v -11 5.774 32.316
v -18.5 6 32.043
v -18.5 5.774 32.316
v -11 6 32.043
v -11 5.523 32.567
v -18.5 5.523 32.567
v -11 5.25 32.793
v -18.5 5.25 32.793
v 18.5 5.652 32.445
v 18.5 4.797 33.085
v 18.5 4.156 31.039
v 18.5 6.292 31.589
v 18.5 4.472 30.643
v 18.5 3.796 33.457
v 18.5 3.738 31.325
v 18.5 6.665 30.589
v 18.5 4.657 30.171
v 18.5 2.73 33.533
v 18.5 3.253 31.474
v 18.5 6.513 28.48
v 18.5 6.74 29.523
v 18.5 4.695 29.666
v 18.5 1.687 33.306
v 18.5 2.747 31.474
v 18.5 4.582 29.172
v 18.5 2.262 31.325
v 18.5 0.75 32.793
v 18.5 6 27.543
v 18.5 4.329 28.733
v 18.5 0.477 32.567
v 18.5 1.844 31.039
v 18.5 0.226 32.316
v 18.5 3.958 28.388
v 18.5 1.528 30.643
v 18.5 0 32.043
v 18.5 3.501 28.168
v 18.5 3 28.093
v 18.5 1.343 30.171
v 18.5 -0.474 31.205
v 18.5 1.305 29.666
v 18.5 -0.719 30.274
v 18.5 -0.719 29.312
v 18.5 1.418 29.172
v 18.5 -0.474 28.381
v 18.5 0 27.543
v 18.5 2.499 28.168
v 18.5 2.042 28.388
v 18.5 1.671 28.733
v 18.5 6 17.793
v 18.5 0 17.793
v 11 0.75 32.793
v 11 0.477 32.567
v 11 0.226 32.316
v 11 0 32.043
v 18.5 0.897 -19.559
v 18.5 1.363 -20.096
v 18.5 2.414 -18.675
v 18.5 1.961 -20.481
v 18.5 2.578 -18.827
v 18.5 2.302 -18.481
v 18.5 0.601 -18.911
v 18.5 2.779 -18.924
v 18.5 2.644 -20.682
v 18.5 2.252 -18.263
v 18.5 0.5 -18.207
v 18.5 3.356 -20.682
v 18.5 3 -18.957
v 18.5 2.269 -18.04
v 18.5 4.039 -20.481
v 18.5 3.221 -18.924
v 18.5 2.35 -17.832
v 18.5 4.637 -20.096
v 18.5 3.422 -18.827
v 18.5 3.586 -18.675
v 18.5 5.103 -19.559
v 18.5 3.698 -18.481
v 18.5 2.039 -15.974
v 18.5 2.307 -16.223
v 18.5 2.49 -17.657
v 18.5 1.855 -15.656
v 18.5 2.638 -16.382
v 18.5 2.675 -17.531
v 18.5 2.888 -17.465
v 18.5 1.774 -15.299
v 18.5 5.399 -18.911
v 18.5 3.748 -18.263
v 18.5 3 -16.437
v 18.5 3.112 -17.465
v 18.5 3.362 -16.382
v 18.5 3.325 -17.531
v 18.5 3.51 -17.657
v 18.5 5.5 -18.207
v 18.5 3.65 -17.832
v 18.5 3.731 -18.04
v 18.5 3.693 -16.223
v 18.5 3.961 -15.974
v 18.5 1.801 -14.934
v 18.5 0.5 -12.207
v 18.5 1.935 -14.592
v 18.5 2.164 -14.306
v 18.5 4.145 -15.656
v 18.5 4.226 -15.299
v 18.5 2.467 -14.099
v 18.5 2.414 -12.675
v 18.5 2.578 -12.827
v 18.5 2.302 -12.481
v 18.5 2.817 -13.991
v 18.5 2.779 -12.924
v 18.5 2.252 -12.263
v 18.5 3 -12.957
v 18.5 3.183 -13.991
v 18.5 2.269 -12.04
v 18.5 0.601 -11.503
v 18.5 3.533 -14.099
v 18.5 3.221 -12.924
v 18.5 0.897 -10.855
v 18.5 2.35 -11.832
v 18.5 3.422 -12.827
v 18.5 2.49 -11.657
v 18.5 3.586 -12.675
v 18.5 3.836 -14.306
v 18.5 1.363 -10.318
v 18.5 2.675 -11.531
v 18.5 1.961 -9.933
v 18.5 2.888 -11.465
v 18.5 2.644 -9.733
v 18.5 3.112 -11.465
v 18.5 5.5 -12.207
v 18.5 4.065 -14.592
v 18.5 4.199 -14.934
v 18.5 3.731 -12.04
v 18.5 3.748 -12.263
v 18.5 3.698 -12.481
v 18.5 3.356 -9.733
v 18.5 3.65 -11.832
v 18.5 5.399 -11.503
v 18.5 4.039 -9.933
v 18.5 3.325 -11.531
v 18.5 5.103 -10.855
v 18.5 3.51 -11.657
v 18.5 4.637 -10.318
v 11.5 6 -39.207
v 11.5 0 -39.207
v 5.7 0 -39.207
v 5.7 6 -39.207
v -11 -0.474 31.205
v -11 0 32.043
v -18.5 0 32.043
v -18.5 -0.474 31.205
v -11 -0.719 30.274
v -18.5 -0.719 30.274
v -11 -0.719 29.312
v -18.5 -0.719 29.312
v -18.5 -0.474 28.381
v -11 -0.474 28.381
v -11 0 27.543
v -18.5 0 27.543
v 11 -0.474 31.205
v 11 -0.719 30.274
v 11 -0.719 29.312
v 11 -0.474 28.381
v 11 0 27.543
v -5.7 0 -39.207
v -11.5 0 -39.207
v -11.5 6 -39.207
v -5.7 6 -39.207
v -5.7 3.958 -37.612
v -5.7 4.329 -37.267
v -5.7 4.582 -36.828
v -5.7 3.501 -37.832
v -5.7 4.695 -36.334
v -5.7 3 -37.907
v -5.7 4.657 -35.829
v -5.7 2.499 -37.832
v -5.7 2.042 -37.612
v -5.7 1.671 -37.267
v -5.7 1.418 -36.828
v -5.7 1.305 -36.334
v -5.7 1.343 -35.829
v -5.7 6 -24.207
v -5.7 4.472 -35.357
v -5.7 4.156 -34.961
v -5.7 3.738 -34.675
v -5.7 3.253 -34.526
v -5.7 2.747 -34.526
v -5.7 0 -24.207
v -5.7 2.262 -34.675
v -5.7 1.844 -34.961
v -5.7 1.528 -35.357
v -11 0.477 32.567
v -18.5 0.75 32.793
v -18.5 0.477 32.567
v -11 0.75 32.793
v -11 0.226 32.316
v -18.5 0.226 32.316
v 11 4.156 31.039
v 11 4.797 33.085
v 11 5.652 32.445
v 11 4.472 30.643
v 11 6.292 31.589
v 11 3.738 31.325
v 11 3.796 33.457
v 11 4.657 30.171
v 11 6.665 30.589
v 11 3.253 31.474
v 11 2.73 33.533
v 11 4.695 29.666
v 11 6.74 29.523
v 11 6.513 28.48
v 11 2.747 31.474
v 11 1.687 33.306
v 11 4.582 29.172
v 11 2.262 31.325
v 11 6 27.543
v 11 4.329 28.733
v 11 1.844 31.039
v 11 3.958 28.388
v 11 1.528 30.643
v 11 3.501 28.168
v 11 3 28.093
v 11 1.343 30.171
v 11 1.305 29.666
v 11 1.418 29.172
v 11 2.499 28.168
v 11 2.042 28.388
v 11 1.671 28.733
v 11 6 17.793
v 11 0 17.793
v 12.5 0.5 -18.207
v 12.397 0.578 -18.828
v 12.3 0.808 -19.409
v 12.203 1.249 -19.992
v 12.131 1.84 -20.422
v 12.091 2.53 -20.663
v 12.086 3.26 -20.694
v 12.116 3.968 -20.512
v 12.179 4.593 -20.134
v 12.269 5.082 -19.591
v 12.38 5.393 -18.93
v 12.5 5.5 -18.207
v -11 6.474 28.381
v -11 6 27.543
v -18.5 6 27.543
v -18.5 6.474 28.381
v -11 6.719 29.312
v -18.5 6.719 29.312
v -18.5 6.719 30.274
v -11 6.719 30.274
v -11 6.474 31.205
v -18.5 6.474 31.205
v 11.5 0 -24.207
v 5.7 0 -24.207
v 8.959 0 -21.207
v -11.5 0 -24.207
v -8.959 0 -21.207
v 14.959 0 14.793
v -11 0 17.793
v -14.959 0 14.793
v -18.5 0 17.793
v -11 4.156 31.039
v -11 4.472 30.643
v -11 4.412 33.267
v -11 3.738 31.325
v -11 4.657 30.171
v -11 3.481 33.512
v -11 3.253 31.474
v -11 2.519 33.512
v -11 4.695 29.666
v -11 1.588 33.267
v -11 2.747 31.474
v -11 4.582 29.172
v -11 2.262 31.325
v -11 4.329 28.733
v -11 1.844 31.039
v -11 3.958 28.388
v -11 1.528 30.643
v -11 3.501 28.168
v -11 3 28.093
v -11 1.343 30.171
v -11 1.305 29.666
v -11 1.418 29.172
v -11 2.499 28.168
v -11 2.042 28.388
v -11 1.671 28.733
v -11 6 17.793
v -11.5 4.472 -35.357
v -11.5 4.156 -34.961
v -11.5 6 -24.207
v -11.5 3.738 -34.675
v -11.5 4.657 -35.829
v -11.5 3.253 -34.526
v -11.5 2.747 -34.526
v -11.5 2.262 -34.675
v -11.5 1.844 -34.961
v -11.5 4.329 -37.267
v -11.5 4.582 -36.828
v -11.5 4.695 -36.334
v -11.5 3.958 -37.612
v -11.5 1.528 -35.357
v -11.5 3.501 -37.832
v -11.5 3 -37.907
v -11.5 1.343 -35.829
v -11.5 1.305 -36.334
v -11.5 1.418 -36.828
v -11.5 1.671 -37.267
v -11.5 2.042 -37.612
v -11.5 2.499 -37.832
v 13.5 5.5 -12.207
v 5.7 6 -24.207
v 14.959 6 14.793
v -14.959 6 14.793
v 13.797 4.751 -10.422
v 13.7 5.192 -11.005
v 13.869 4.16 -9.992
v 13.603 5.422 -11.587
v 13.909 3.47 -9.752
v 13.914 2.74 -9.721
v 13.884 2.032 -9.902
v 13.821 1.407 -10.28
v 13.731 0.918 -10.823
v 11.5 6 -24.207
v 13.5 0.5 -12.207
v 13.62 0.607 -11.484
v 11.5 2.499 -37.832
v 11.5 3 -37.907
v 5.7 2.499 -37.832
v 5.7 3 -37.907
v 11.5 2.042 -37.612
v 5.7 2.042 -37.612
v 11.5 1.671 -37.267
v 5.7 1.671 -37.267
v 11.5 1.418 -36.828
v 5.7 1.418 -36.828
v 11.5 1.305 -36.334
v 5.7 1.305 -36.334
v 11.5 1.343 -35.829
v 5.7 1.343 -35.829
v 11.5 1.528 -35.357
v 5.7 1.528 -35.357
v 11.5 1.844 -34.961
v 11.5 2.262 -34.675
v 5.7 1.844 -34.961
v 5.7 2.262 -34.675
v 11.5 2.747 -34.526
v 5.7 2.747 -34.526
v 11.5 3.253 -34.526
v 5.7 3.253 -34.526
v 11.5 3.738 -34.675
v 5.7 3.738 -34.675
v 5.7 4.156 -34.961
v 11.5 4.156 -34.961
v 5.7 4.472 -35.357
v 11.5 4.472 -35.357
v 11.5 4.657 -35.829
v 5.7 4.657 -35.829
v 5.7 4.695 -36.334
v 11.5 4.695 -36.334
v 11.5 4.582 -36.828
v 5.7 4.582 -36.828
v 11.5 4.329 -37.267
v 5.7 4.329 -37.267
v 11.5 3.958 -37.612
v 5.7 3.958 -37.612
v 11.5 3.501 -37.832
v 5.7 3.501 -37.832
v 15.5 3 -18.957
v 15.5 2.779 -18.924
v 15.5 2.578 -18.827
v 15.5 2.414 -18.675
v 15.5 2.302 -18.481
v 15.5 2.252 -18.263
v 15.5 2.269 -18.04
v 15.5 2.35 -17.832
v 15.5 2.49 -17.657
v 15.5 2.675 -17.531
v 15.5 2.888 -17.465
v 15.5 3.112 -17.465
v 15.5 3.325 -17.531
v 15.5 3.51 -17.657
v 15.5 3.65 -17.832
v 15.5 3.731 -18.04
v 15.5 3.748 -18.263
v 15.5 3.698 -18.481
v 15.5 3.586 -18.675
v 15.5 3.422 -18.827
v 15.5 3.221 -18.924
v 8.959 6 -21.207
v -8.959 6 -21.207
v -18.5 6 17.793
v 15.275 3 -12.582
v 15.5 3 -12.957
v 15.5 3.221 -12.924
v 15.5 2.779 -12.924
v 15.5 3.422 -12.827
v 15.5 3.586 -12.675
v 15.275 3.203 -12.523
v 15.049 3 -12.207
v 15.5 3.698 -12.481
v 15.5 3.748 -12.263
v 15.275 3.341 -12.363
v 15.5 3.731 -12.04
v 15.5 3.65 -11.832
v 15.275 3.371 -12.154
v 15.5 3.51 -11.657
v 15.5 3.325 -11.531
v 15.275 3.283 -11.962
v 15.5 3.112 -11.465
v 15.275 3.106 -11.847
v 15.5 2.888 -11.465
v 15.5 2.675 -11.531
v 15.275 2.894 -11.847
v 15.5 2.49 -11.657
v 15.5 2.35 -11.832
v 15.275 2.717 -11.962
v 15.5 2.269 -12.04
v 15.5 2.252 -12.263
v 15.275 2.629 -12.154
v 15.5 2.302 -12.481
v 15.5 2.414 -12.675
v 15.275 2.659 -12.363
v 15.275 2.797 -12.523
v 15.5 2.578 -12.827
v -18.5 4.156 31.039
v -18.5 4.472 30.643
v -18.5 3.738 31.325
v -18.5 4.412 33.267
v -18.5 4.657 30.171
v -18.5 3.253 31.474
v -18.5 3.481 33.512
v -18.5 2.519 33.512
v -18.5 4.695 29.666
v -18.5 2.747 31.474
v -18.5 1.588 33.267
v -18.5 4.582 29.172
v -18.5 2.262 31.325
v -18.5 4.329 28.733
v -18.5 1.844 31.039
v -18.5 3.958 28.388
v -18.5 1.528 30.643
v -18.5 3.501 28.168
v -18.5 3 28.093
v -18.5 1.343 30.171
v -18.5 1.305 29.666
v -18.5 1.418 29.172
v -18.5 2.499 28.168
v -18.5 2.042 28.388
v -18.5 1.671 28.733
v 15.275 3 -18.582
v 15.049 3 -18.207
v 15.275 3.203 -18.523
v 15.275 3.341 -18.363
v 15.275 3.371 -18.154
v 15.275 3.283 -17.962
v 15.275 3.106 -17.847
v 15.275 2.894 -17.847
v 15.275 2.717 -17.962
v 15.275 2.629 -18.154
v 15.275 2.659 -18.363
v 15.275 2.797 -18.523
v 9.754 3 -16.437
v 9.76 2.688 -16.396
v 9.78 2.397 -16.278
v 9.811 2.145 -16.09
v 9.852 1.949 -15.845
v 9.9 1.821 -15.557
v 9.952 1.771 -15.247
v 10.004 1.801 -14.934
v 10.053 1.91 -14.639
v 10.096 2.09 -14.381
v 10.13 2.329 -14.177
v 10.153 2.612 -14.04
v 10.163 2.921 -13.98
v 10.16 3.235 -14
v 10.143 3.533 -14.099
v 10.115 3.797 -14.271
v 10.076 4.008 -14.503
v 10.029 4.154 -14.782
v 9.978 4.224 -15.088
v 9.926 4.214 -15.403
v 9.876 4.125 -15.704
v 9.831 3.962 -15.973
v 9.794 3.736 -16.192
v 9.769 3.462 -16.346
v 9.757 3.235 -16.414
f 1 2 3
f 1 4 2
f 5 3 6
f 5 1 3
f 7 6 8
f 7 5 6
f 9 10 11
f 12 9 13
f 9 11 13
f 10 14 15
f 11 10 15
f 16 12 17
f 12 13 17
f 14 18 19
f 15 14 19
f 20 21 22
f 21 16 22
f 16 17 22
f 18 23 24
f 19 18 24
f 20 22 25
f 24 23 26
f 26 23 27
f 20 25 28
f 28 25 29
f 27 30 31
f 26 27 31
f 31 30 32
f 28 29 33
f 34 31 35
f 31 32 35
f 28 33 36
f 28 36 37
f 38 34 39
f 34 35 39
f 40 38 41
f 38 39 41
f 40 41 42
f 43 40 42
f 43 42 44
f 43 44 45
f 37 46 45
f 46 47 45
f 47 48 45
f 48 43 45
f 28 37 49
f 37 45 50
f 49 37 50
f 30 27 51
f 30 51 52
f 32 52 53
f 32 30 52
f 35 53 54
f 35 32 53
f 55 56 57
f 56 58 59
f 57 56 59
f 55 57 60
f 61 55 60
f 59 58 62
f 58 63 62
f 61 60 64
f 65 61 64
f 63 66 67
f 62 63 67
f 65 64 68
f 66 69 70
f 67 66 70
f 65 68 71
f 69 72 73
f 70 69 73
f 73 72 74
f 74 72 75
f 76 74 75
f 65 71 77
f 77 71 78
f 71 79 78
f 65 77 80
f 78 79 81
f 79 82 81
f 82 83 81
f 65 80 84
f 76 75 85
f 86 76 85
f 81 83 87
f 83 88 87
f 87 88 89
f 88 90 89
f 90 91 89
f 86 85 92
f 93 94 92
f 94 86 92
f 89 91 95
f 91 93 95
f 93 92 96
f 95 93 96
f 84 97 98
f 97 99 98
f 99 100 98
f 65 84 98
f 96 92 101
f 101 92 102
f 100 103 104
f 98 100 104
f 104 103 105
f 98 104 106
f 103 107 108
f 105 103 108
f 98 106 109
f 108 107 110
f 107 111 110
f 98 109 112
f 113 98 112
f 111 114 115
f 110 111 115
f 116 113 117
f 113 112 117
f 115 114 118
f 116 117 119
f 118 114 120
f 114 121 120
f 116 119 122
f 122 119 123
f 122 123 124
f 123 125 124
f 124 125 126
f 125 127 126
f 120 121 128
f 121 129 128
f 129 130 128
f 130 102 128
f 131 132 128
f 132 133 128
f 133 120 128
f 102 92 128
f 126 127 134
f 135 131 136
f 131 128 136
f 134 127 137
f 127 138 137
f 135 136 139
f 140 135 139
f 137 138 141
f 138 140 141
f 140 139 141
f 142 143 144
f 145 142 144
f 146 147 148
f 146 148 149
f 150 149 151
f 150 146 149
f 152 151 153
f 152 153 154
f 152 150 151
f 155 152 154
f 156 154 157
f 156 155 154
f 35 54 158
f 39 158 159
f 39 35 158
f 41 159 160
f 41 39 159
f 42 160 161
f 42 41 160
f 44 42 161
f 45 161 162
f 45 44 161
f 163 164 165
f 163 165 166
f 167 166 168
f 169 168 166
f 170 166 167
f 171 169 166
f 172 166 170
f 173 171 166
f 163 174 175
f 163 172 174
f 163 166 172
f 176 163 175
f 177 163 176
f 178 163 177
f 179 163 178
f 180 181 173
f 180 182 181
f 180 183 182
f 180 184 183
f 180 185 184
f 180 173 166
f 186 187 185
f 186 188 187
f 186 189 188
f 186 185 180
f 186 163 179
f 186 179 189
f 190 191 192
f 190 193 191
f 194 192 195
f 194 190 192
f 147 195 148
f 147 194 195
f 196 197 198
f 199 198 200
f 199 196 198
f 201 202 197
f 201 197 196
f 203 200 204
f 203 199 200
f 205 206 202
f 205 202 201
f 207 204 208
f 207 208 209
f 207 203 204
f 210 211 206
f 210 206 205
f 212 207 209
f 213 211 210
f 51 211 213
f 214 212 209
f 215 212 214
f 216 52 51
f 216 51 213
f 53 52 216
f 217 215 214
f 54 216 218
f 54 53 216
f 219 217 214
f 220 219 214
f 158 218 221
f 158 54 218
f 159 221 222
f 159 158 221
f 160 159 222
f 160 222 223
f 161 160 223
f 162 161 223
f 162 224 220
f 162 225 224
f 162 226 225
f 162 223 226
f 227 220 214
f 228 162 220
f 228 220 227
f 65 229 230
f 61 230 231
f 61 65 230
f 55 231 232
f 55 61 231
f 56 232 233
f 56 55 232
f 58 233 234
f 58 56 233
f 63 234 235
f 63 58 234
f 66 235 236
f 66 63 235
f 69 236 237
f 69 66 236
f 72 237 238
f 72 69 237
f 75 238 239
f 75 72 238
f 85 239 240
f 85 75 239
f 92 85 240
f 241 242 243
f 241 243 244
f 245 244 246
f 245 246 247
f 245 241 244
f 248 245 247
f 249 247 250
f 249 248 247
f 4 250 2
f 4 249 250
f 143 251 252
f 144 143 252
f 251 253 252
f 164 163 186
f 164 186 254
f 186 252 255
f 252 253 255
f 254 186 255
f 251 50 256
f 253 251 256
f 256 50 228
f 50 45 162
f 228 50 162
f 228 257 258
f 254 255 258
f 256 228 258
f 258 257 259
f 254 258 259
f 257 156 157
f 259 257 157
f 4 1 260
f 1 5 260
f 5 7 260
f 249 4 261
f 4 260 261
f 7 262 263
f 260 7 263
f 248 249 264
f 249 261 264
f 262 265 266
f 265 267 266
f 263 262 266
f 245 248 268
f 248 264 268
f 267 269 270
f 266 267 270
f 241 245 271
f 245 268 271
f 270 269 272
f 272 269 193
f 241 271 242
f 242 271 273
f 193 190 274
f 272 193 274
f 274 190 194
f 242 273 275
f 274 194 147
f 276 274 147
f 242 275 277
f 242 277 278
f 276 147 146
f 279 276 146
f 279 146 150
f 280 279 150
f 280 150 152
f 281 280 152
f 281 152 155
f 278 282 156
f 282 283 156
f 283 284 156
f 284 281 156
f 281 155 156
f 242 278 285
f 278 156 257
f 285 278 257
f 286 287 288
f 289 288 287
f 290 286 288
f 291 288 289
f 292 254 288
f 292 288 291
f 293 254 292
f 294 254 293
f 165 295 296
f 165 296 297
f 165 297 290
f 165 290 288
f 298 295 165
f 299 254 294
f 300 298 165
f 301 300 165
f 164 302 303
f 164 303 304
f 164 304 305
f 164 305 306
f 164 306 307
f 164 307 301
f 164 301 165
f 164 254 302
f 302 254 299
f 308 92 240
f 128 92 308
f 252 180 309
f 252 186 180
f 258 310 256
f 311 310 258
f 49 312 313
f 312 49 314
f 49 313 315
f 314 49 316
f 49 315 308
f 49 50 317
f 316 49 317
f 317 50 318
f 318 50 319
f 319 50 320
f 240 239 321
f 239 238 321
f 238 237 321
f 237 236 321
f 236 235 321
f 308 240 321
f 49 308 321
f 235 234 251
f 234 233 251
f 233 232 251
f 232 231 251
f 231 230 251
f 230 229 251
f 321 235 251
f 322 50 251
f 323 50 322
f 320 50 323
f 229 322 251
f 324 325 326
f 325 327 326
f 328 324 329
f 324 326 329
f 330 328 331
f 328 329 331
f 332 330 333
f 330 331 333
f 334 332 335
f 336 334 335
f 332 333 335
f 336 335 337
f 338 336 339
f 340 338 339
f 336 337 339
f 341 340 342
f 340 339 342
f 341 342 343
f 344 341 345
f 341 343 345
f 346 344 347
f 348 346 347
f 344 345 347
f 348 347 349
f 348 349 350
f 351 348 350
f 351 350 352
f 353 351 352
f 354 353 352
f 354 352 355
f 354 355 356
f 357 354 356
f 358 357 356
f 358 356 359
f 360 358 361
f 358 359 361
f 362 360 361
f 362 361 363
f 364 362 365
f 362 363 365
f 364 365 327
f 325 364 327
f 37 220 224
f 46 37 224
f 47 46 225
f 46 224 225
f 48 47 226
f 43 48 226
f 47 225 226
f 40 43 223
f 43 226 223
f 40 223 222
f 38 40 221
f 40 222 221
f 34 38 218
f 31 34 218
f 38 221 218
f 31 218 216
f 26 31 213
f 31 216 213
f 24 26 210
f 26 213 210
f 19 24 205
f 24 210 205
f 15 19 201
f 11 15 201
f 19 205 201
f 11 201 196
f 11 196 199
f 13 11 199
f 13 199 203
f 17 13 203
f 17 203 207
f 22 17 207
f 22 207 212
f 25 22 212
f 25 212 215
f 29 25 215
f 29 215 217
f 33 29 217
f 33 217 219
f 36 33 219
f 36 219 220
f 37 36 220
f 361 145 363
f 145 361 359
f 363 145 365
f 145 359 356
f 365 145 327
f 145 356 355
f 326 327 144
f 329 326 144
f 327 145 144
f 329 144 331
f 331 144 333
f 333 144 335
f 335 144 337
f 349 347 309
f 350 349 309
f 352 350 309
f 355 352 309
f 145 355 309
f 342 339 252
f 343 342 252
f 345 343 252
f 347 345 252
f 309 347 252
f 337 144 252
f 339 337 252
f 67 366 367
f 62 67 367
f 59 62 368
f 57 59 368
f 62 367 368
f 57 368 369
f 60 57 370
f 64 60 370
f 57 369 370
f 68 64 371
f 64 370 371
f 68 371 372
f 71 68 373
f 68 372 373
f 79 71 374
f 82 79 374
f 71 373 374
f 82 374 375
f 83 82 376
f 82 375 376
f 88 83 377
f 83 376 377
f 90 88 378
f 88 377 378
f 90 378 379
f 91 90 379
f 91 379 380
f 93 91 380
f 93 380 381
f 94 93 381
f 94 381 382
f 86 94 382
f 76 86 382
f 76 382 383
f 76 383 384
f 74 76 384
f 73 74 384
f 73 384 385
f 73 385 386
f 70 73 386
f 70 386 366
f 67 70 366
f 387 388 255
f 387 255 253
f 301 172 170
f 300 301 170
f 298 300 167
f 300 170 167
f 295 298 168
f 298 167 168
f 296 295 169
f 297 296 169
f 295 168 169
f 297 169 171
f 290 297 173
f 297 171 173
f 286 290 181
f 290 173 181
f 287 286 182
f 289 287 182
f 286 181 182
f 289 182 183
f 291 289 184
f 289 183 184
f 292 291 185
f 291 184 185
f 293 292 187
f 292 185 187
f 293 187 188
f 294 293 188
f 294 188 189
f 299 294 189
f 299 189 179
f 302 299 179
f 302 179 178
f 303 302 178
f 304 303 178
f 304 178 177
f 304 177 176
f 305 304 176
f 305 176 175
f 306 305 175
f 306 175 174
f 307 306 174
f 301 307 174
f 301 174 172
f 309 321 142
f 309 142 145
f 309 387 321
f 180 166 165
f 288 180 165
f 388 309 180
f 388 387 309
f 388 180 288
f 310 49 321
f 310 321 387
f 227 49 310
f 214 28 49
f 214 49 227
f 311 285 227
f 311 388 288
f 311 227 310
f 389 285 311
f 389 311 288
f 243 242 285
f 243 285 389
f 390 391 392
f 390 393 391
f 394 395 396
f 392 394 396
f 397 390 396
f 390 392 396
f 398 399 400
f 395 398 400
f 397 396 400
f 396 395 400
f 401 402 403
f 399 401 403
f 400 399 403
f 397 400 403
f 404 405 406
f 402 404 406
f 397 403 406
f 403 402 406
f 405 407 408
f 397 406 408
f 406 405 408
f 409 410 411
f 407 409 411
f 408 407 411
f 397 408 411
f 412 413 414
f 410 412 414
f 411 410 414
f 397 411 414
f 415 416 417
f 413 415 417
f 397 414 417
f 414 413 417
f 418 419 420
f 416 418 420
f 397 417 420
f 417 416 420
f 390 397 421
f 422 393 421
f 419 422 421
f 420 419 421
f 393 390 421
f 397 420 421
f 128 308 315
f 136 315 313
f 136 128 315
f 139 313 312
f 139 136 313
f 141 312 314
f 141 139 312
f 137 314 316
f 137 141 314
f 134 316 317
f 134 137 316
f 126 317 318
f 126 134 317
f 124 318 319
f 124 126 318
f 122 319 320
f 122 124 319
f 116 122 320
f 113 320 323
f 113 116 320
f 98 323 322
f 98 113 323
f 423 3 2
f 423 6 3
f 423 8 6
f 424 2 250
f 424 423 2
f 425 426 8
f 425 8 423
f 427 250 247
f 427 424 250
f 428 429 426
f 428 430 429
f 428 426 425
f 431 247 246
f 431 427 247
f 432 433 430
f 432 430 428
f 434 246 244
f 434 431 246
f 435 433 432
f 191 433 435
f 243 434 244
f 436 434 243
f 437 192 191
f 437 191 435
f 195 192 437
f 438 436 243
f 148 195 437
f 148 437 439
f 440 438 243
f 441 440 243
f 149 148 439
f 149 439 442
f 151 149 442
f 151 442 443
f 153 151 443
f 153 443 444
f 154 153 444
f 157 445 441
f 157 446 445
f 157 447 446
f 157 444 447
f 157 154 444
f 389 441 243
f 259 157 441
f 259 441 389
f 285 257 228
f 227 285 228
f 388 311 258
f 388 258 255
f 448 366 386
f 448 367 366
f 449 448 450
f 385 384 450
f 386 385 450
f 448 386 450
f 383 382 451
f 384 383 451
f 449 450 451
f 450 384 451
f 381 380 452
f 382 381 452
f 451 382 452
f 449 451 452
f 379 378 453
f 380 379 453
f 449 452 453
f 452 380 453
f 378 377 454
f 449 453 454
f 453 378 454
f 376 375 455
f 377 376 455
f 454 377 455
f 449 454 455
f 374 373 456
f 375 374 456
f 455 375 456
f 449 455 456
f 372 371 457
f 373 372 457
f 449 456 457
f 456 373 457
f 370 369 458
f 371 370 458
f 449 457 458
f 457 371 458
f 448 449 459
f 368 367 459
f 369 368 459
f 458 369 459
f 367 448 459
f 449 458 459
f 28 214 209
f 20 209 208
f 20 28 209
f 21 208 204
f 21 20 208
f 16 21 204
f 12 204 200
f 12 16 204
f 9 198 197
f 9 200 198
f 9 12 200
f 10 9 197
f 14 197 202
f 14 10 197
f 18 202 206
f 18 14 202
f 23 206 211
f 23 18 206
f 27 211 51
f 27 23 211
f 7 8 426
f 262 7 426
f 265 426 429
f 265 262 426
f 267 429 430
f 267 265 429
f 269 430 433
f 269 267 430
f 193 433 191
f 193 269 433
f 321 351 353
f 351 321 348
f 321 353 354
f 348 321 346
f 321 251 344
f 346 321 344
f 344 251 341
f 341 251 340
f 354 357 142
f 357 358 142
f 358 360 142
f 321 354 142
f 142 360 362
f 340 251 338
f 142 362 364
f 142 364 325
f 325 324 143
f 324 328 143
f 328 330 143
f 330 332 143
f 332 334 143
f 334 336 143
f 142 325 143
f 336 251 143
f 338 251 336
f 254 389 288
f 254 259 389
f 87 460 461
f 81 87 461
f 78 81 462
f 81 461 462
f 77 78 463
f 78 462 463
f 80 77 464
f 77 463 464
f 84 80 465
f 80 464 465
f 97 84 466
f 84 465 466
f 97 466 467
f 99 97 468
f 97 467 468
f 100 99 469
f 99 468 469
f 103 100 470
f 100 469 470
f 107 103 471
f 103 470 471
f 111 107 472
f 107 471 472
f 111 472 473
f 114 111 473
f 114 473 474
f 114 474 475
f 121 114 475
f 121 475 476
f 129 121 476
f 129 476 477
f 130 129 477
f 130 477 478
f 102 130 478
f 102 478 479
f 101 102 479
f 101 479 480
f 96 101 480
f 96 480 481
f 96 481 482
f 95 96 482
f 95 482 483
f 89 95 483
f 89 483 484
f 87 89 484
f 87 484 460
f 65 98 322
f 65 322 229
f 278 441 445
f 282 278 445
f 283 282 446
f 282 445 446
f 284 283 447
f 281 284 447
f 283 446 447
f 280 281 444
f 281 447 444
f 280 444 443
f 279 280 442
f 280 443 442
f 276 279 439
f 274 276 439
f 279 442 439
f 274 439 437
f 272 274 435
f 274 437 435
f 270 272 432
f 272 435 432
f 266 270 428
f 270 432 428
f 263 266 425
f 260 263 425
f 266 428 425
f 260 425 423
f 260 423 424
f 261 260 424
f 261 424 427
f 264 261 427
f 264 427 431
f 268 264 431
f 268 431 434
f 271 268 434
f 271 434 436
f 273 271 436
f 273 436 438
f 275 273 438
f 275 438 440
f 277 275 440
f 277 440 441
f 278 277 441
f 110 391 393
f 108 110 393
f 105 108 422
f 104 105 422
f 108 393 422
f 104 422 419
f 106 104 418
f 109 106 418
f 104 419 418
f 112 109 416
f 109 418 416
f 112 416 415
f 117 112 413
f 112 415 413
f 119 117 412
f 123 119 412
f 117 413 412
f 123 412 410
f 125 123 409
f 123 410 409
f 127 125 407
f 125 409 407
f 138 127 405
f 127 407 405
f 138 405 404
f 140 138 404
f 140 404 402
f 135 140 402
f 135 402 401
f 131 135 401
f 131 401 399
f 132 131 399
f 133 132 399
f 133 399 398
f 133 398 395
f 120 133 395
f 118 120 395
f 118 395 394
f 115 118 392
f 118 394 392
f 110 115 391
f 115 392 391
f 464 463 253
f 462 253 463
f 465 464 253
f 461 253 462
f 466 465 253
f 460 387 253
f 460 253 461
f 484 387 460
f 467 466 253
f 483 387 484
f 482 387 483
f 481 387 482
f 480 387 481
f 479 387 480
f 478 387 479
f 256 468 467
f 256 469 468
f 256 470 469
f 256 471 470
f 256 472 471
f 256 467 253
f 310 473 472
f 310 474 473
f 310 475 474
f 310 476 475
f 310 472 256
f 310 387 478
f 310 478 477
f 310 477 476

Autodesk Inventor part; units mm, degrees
ref_plane "YZ Plane" through (0, 0, 0) normal (1, 0, 0) x (0, 1, 0)
ref_plane "XZ Plane" through (0, 0, 0) normal (0, 1, 0) x (-1, 0, 0)
ref_plane "XY Plane" through (0, 0, 0) normal (0, 0, 1) x (1, 0, 0)
sketch "Sketch1" plane through (0, 0, 0) normal (0, 1, 0) x (-1, 0, 0)
  line L0 (11, 32.7929) -> (11, 17.7929)
  line L1 (11, 17.7929) -> (-2.062, 17.7929)
  line L2 (11, 32.7929) -> (18.5, 32.7929)
  line L3 (18.5, 32.7929) -> (18.5, 17.7929)
  line L4 (18.5, 17.7929) -> (11.5, -24.2071)
  line L5 (11.5, -24.2071) -> (11.5, -39.2071)
  line L6 (11.5, -39.2071) -> (5.7, -39.2071)
  line L7 (5.7, -39.2071) -> (5.7, -24.2071)
  line L8 (5.7, -24.2071) -> (0.6352, -24.2071)
  line L9 (0, 0) -> (0, 4.5611)
  line L10 (-11, 32.7929) -> (-11, 17.7929)
  line L11 (-11, 17.7929) -> (-2.062, 17.7929)
  line L12 (-11, 32.7929) -> (-18.5, 32.7929)
  line L13 (-18.5, 32.7929) -> (-18.5, 17.7929)
  line L14 (-18.5, 17.7929) -> (-11.5, -24.2071)
  line L15 (-11.5, -24.2071) -> (-11.5, -39.2071)
  line L16 (-11.5, -39.2071) -> (-5.7, -39.2071)
  line L17 (-5.7, -39.2071) -> (-5.7, -24.2071)
  line L18 (-5.7, -24.2071) -> (0.6352, -24.2071)
  dimension "d0" = 37
  dimension "d1" = 7.5
  dimension "d2" = 15
  dimension "d3" = 5.8
  dimension "d4" = 23
  dimension "d5" = 72
  dimension "d6" = 15
  dimension "d7" = 15
  dimension "d8" = 15
extrude "Extrusion1" add sketch "Sketch1" along normal blind 6
sketch "Sketch2" plane through (0, 6, 0) normal (0, 1, 0) x (1, 0, 0)
  line L0 (-11, -17.7929) -> (11, -17.7929) projected
  line L1 (18.5, -17.7929) -> (11.5, 24.2071) projected
  line L2 (5.7, 24.2071) -> (-5.7, 24.2071) projected
  line L3 (-11.5, 24.2071) -> (-18.5, -17.7929) projected
  line L4 (-14.9586, -14.7929) -> (-8.9586, 21.2071)
  line L5 (-8.9586, 21.2071) -> (8.9586, 21.2071)
  line L6 (8.9586, 21.2071) -> (14.9586, -14.7929)
  line L7 (14.9586, -14.7929) -> (-14.9586, -14.7929)
  point P0 (0, 0)
  dimension "d11" = 3
  dimension "d12" = 3
  dimension "d13" = 3
  dimension "d14" = 3
extrude "Extrusion2" cut sketch "Sketch2" against normal blind 6
sketch "Sketch3" plane through (-5.7, 0, -24.2071) normal (1, 0, 0) x (0, 0, -1)
  line L0 (15, 0) -> (15, 6) projected
  circle A0 centre (12, 3) radius 1.7
  point P0 (-24.2071, 0)
  dimension "d17" = 3.4
  dimension "d18" = 3
extrude "Extrusion3" cut sketch "Sketch3" along normal through all both and the other way through all
sketch "Sketch4" plane through (18.5, 0, 32.7929) normal (1, 0, 0) x (0, 0, -1)
  line L0 (0, 0) -> (0, 6) projected
  circle A0 centre (3, 3) radius 3.75
  point P0 (32.7929, 0)
  dimension "d21" = 7.5
  dimension "d22" = 3
extrude "Extrusion4" add sketch "Sketch4" against normal up to surface (7.5 mm away)
sketch "Sketch5" plane through (18.5, 0, 17.7929) normal (1, 0, 0) x (0, 0, -1)
  line L0 (-15, 6) -> (-14.25, 6) projected
  line L1 (-15, 0) -> (-15, 0.75) projected
  line L2 (-15, 0) -> (-14.25, 0) projected
  line L3 (-15, 5.25) -> (-15, 6)
  line L4 (-15, 6) -> (-14.25, 6)
  line L5 (-15, 0.75) -> (-15, 0)
  line L6 (-15, 0) -> (-14.25, 0)
  arc A0 (-14.25, 6) -> (-15, 5.25) centre (-12, 3) ccw
  arc A1 (-15, 0.75) -> (-14.25, 0) centre (-12, 3) ccw
  point P0 (17.7929, 0)
extrude "Extrusion5" cut sketch "Sketch5" against normal through all
sketch "Sketch6" plane through (-11, 0, 17.7929) normal (1, 0, 0) x (0, 0, -1)
  arc A0 (-15, 0.75) -> (-14.25, 0) centre (-12, 3) ccw projected
  circle A1 centre (-12, 3) radius 3.75
  point P0 (17.7929, 0)
  dimension "d27" = 7.5
extrude "Extrusion6" add sketch "Sketch6" against normal up to surface (7.5 mm away)
hole "Hole1" at (18.5, 3, 29.7929) direction (-1, 0, 0) diameter 3.4 depth 46.75 tip angle 118
ref_plane "Work Plane1" through (18.5, 0, -39.2071) normal (-1, 0, 0) x (0, 0, 1)
sketch "Sketch7" plane through (18.5, 0, -39.2071) normal (-1, 0, 0) x (0, 0, 1)
  line L0 (27, 3) -> (21, 3) construction
  line L1 (27, 0.5) -> (21, 0.5)
  line L2 (21, 5.5) -> (27, 5.5)
  arc A0 (27, 0.5) -> (27, 5.5) centre (27, 3) ccw
  arc A1 (21, 5.5) -> (21, 0.5) centre (21, 3) ccw
  circle A2 centre (3, 3) radius 1.7 projected
  line L3 (15, 0) -> (15, 6) projected
  point P0 (39.2071, 0)
  point P1 (24, 3)
  point P2 (15, 3)
  dimension "d40" = 21
  dimension "d41" = 5
  dimension "d42" = 6
extrude "Extrusion7" add sketch "Sketch7" along normal blind 7.25 contours L1 A1 L2 A0
sketch "Sketch8" plane through (18.5, 0, -39.2071) normal (1, 0, 0) x (0, 0, -1)
  arc A0 (-21, 0.5) -> (-21, 5.5) centre (-21, 3) ccw projected
  arc A1 (-27, 5.5) -> (-27, 0.5) centre (-27, 3) ccw projected
  point P0 (-39.2071, 0)
hole "Hole2" at (18.5, 3, -12.2071) at (18.5, 3, -18.2071) direction (-1, 0, 0) diameter 1.5 depth 3 tip angle 118
sketch "Sketch9" plane through (18.5, 0, -39.2071) normal (1, 0, 0) x (0, 0, -1)
  arc A0 (-21, 0.5) -> (-21, 5.5) centre (-21, 3) ccw projected
  arc A1 (-27, 5.5) -> (-27, 0.5) centre (-27, 3) ccw projected
  line L0 (-27, 3) -> (-21, 3)
  point P0 (-39.2071, 0)
  point P1 (-24, 3)
hole "Hole3" at (18.5, 3, -15.2071) direction (-1, 0, 0) diameter 2.459 depth 10.8 tip angle 118 thread size "M3x0.5" class "6H" standard "ISO Metric profile"
equation "\"d8\" = d7"
properties part number "500-006" material "ABS Plastic"
